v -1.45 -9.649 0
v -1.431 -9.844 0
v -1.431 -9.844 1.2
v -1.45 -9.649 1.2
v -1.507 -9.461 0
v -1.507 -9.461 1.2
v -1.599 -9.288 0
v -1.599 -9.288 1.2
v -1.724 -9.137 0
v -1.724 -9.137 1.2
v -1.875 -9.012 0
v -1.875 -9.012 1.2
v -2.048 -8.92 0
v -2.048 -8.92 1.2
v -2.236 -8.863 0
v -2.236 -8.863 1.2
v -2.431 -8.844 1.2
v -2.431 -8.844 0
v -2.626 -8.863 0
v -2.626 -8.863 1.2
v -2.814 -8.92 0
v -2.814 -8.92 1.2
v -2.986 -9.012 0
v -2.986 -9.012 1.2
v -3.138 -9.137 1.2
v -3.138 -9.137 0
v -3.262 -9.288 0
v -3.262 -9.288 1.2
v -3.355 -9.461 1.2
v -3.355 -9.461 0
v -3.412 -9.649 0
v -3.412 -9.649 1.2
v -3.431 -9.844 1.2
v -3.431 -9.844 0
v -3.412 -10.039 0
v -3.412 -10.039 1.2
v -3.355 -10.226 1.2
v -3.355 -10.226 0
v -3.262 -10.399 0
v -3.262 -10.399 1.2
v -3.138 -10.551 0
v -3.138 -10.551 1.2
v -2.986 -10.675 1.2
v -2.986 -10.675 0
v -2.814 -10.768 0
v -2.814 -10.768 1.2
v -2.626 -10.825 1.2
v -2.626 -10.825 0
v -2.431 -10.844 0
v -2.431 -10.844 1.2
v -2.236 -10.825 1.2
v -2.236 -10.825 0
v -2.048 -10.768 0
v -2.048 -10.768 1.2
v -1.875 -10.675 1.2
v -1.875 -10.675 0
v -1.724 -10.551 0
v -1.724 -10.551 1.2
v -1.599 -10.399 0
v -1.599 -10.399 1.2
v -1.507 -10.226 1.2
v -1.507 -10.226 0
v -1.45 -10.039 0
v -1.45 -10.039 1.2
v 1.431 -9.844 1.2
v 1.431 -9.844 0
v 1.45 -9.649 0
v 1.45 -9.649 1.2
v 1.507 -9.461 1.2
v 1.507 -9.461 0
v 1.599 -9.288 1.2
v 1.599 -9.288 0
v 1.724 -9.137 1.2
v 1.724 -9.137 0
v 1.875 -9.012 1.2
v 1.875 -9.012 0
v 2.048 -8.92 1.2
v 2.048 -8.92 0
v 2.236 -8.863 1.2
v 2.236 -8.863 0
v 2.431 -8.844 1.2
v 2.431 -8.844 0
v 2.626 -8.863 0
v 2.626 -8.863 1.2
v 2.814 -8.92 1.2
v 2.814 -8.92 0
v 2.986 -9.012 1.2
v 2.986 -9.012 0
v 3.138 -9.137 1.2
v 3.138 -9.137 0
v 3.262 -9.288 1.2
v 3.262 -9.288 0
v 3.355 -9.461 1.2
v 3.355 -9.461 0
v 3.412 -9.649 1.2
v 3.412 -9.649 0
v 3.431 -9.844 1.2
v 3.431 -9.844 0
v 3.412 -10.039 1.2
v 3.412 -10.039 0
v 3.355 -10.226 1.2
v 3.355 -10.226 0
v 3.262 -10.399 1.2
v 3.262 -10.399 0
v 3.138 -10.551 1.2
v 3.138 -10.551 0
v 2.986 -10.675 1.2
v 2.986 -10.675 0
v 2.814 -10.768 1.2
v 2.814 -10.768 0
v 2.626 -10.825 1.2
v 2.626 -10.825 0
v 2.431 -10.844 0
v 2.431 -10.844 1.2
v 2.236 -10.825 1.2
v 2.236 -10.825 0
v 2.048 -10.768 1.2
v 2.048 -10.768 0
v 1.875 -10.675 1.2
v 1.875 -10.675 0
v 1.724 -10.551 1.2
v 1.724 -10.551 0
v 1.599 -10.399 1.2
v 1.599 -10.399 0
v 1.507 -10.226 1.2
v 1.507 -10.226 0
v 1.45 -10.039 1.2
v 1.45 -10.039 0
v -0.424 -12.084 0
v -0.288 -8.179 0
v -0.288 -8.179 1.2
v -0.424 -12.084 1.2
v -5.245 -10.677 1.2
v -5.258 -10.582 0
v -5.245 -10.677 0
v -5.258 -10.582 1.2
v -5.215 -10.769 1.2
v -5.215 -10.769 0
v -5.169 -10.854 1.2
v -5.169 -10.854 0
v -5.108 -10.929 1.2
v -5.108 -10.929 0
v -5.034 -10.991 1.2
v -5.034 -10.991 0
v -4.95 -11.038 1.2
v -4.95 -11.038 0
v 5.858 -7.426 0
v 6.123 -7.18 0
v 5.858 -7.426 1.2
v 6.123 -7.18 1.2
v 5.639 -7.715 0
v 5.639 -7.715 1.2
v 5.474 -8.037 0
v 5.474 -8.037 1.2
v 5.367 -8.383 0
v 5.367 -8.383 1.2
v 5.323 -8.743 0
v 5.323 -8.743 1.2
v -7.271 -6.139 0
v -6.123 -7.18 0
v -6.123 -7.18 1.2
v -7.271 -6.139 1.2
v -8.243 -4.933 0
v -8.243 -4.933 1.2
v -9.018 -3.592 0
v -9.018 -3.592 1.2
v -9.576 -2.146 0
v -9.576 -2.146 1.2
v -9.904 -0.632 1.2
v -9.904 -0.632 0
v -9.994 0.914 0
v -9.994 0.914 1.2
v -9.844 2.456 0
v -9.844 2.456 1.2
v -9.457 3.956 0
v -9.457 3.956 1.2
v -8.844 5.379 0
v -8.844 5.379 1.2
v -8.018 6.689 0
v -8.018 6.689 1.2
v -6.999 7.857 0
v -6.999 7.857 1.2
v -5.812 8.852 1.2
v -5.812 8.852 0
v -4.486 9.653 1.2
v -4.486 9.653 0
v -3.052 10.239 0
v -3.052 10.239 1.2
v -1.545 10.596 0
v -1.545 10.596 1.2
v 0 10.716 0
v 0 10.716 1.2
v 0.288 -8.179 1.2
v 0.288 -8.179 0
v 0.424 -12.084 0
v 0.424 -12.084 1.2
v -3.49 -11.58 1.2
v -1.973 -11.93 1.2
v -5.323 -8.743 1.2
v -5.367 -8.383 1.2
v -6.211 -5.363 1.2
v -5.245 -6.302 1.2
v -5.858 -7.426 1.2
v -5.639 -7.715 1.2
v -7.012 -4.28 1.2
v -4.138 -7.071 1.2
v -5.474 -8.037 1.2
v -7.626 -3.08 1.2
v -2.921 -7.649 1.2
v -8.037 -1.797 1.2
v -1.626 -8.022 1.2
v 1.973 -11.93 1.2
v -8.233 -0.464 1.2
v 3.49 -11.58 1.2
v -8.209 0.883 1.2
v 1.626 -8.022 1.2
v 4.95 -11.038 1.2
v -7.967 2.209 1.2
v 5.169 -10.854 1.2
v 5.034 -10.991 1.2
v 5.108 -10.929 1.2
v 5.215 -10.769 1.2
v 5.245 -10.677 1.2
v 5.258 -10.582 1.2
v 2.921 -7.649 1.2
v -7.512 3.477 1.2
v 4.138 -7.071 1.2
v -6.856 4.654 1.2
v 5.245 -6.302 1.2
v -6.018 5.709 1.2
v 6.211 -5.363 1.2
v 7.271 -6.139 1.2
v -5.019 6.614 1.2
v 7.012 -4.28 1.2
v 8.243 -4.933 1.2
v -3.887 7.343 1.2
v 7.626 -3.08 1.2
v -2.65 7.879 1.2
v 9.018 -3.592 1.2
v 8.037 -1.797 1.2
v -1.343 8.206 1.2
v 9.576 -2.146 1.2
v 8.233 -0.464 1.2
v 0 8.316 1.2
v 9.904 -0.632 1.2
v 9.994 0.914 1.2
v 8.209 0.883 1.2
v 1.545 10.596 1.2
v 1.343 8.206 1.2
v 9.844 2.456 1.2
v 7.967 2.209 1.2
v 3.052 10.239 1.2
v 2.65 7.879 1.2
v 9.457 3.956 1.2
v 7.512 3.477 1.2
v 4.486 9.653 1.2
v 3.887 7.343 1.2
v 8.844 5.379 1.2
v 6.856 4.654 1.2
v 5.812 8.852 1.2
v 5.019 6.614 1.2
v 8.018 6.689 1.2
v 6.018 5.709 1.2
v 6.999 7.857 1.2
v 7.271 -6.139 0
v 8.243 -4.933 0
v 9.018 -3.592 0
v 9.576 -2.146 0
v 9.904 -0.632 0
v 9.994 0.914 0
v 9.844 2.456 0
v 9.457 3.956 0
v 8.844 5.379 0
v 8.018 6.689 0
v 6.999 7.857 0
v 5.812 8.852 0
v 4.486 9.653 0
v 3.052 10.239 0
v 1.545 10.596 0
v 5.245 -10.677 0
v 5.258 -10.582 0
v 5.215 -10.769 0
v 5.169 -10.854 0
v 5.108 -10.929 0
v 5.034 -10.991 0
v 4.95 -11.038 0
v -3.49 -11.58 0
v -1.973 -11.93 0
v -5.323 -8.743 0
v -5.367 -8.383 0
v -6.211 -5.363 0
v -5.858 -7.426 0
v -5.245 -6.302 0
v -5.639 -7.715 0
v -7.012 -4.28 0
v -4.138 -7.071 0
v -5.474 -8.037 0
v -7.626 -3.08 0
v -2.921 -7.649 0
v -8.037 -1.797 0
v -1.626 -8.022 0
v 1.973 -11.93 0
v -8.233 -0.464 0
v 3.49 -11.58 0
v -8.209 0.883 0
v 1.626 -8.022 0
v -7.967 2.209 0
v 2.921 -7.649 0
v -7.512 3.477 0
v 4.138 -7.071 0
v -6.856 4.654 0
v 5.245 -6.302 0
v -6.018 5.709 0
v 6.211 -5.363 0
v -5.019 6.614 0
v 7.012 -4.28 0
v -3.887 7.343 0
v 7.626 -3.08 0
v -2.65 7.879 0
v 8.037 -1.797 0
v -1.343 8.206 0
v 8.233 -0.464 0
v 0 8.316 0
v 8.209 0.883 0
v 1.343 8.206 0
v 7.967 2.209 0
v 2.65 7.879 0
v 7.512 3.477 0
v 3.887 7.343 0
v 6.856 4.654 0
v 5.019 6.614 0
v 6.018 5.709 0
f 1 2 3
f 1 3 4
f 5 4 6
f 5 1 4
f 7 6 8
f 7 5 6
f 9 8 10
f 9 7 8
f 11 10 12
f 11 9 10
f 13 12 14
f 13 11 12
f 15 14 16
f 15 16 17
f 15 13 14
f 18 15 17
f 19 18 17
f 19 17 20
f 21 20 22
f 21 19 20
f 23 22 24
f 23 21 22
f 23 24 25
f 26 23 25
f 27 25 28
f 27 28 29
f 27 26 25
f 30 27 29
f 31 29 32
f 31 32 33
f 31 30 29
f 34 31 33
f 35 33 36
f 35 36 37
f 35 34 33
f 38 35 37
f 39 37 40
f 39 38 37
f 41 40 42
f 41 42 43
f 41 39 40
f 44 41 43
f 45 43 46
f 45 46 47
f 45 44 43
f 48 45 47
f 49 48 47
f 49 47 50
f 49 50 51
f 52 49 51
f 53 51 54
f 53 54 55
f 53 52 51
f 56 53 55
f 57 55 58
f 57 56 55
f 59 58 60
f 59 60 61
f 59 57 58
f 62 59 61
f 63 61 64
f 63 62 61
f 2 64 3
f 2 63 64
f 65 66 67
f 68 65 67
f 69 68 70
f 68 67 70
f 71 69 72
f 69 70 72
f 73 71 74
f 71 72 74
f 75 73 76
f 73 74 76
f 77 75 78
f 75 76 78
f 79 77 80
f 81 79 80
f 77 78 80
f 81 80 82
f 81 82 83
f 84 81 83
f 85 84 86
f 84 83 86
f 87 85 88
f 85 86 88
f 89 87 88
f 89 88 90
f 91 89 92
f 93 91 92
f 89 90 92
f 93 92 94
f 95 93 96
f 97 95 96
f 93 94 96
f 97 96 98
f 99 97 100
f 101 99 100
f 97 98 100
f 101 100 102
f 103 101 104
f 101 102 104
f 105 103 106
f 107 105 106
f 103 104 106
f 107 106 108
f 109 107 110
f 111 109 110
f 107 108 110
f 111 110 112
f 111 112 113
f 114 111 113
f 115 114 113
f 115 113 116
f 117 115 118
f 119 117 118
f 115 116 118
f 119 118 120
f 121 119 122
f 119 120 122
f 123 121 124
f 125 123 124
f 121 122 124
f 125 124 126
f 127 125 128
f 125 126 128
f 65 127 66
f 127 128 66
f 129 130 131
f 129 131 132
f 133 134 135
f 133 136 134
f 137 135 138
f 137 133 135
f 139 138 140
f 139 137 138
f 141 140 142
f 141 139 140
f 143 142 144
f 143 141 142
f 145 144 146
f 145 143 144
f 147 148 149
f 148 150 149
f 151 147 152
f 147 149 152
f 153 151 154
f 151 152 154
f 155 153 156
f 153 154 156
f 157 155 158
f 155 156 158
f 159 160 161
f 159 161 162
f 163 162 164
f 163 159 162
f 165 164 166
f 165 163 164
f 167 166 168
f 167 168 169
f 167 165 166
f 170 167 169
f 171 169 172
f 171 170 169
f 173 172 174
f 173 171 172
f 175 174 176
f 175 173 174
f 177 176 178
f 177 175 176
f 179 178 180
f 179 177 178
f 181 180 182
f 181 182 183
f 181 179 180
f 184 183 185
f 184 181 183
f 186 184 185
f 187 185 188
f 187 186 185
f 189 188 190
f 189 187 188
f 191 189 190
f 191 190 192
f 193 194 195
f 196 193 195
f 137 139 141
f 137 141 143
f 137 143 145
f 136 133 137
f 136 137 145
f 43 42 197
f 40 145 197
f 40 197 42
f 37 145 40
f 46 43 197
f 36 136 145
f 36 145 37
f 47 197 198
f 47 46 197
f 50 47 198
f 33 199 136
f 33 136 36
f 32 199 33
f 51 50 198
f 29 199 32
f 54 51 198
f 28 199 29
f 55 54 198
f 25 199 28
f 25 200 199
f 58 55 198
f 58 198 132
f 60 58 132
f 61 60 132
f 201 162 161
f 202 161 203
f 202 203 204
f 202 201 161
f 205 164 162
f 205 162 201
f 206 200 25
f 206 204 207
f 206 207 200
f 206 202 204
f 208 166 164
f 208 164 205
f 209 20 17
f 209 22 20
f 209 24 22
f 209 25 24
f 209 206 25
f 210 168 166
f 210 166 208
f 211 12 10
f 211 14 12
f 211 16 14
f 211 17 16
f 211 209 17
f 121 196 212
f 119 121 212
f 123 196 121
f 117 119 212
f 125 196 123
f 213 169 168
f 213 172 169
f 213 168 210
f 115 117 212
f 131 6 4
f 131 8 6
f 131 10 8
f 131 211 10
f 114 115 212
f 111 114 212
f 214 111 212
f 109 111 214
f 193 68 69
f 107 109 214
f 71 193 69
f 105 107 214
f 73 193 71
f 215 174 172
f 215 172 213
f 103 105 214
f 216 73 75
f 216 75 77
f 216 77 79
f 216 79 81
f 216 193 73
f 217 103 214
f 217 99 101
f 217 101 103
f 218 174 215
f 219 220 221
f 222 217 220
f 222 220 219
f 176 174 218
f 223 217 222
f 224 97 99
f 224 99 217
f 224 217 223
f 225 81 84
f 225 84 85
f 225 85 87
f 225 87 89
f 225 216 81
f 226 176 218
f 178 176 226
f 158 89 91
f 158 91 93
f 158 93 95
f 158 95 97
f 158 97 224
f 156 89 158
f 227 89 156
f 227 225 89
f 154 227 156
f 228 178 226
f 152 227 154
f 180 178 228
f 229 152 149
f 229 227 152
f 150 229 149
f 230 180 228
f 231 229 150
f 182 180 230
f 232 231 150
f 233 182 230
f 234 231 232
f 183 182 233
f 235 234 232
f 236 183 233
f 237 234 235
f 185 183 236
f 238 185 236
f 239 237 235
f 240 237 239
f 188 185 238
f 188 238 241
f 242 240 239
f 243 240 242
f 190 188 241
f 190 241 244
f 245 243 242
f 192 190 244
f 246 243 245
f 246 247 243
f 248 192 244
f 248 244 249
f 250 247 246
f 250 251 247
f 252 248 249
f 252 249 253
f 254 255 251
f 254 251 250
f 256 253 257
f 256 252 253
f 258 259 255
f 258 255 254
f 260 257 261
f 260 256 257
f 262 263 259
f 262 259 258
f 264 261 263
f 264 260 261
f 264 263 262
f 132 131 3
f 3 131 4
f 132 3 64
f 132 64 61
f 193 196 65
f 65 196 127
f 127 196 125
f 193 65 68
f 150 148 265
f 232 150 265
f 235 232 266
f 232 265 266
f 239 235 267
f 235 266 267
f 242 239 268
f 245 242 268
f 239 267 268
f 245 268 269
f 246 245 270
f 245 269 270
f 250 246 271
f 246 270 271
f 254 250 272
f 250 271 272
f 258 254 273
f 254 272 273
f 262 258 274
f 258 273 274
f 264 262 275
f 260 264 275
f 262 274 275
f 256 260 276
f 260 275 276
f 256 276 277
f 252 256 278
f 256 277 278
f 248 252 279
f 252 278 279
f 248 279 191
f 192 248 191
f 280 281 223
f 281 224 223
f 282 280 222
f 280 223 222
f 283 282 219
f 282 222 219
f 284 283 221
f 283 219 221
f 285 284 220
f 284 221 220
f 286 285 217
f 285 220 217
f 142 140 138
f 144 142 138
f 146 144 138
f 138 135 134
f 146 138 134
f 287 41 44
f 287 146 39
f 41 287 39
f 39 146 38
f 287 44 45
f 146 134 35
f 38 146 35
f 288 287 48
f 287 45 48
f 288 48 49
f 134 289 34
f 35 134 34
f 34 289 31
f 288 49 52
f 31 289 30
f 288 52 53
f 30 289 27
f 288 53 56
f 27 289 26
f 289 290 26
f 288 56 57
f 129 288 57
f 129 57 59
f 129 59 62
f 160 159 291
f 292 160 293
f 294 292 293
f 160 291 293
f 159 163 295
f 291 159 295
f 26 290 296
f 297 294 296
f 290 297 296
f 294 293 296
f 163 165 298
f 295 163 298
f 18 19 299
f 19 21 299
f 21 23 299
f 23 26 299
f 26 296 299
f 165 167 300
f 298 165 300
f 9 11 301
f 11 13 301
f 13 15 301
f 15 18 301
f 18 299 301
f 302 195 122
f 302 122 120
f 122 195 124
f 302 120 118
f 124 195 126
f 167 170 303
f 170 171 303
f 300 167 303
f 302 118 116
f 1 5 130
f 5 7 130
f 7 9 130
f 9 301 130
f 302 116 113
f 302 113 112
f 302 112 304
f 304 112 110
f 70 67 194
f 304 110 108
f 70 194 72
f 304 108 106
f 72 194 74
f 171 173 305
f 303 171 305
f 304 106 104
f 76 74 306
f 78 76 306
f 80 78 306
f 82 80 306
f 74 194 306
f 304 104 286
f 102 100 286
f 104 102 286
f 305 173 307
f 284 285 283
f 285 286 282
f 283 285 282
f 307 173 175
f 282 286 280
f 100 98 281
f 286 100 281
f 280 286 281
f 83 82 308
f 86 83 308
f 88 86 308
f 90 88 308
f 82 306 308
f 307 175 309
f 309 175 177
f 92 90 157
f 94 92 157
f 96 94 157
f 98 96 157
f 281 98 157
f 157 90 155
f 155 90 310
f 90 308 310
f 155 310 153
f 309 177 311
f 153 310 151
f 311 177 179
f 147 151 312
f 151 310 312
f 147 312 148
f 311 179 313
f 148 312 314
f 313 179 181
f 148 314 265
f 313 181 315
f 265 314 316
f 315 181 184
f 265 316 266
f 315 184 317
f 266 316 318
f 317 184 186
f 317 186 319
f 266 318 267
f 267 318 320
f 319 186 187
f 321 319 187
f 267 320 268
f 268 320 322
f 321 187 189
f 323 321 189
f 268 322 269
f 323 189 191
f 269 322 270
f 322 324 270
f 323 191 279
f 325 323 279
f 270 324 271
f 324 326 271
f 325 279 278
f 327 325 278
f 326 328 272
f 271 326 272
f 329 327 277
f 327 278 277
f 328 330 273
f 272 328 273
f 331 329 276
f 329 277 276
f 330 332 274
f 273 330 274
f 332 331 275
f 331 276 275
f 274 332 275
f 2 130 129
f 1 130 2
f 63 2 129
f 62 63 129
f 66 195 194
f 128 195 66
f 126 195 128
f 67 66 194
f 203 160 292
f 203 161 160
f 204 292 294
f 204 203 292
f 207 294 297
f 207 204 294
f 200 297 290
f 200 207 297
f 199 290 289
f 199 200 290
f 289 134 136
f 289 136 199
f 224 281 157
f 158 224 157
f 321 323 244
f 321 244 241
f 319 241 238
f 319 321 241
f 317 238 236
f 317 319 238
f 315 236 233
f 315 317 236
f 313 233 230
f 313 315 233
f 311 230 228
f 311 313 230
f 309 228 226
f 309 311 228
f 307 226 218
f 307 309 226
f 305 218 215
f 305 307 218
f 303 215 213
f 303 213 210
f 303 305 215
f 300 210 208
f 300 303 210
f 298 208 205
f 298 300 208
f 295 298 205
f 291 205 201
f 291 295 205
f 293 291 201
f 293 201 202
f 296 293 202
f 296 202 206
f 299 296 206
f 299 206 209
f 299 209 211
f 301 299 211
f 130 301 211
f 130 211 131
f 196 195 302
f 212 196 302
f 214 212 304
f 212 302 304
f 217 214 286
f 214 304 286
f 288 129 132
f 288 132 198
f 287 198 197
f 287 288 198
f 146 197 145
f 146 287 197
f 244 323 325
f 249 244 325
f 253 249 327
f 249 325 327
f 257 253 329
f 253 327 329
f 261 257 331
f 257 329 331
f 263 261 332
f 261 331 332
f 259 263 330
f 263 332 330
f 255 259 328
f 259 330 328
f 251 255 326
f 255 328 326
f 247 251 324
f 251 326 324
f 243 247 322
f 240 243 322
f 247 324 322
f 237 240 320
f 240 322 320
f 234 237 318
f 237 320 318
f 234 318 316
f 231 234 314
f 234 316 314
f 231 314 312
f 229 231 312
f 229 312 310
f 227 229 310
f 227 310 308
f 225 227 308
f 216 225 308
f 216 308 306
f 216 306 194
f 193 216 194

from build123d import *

# Parameters (mm, degrees)
SKETCH1_R            = 1
BOSS_EXTRUDE1_DEPTH  = 1.2
FILLET1_R            = 2.07
FILLET4_R            = 0.52
FILLET1_OF_MIRROR1_R = 2.07
FILLET4_OF_MIRROR1_R = 0.52


with BuildPart() as part:
    # Sketch1 → Boss-Extrude1 (new body)
    with BuildSketch(Plane.XY):
        with BuildLine():
            Line((0, 10.716160966), (0, 8.316160966))
            ThreePointArc((0, 8.316160966), (-8.248743485, 0.21014332), (-0.287920848, -8.178813356))
            Line((-0.287920848, -8.178813356), (-0.424287349, -12.083839034))
            ThreePointArc((-0.424287349, -12.083839034), (-2.896253939, -11.741219474), (-5.246180053, -10.901068155))
            Line((-5.246180053, -10.901068155), (-5.359136951, -7.71729271))
            ThreePointArc((-5.359136951, -7.71729271), (-9.598340525, 3.51092083), (0, 10.716160966))
        make_face()
        with Locations((-2.430824062, -9.84376582)):
            Circle(SKETCH1_R, mode=Mode.SUBTRACT)
    boss_extrude1 = extrude(amount=BOSS_EXTRUDE1_DEPTH)

    # Fillet1
    fillet1_edges = [part.edges().sort_by_distance(p)[0] for p in [
        (-5.359136951, -7.71729271, 0.6),
    ]]
    fillet(fillet1_edges, radius=FILLET1_R)

    # Fillet4
    fillet4_edges = [part.edges().sort_by_distance(p)[0] for p in [
        (-5.246180053, -10.901068155, 0.6),
    ]]
    fillet(fillet4_edges, radius=FILLET4_R)

    # Mirror1: Boss-Extrude1 across plane
    add(boss_extrude1.mirror(Plane(origin=(0, 10.716160966, 1.2), x_dir=(0, 0, 1), z_dir=(-1, 0, 0))))

    # Fillet1 of Mirror1
    fillet1_of_mirror1_edges = [part.edges().sort_by_distance(p)[0] for p in [
        (5.359136951, -7.71729271, 0.6),
    ]]
    fillet(fillet1_of_mirror1_edges, radius=FILLET1_OF_MIRROR1_R)

    # Fillet4 of Mirror1
    fillet4_of_mirror1_edges = [part.edges().sort_by_distance(p)[0] for p in [
        (5.246180053, -10.901068155, 0.6),
    ]]
    fillet(fillet4_of_mirror1_edges, radius=FILLET4_OF_MIRROR1_R)


solid = part.part
